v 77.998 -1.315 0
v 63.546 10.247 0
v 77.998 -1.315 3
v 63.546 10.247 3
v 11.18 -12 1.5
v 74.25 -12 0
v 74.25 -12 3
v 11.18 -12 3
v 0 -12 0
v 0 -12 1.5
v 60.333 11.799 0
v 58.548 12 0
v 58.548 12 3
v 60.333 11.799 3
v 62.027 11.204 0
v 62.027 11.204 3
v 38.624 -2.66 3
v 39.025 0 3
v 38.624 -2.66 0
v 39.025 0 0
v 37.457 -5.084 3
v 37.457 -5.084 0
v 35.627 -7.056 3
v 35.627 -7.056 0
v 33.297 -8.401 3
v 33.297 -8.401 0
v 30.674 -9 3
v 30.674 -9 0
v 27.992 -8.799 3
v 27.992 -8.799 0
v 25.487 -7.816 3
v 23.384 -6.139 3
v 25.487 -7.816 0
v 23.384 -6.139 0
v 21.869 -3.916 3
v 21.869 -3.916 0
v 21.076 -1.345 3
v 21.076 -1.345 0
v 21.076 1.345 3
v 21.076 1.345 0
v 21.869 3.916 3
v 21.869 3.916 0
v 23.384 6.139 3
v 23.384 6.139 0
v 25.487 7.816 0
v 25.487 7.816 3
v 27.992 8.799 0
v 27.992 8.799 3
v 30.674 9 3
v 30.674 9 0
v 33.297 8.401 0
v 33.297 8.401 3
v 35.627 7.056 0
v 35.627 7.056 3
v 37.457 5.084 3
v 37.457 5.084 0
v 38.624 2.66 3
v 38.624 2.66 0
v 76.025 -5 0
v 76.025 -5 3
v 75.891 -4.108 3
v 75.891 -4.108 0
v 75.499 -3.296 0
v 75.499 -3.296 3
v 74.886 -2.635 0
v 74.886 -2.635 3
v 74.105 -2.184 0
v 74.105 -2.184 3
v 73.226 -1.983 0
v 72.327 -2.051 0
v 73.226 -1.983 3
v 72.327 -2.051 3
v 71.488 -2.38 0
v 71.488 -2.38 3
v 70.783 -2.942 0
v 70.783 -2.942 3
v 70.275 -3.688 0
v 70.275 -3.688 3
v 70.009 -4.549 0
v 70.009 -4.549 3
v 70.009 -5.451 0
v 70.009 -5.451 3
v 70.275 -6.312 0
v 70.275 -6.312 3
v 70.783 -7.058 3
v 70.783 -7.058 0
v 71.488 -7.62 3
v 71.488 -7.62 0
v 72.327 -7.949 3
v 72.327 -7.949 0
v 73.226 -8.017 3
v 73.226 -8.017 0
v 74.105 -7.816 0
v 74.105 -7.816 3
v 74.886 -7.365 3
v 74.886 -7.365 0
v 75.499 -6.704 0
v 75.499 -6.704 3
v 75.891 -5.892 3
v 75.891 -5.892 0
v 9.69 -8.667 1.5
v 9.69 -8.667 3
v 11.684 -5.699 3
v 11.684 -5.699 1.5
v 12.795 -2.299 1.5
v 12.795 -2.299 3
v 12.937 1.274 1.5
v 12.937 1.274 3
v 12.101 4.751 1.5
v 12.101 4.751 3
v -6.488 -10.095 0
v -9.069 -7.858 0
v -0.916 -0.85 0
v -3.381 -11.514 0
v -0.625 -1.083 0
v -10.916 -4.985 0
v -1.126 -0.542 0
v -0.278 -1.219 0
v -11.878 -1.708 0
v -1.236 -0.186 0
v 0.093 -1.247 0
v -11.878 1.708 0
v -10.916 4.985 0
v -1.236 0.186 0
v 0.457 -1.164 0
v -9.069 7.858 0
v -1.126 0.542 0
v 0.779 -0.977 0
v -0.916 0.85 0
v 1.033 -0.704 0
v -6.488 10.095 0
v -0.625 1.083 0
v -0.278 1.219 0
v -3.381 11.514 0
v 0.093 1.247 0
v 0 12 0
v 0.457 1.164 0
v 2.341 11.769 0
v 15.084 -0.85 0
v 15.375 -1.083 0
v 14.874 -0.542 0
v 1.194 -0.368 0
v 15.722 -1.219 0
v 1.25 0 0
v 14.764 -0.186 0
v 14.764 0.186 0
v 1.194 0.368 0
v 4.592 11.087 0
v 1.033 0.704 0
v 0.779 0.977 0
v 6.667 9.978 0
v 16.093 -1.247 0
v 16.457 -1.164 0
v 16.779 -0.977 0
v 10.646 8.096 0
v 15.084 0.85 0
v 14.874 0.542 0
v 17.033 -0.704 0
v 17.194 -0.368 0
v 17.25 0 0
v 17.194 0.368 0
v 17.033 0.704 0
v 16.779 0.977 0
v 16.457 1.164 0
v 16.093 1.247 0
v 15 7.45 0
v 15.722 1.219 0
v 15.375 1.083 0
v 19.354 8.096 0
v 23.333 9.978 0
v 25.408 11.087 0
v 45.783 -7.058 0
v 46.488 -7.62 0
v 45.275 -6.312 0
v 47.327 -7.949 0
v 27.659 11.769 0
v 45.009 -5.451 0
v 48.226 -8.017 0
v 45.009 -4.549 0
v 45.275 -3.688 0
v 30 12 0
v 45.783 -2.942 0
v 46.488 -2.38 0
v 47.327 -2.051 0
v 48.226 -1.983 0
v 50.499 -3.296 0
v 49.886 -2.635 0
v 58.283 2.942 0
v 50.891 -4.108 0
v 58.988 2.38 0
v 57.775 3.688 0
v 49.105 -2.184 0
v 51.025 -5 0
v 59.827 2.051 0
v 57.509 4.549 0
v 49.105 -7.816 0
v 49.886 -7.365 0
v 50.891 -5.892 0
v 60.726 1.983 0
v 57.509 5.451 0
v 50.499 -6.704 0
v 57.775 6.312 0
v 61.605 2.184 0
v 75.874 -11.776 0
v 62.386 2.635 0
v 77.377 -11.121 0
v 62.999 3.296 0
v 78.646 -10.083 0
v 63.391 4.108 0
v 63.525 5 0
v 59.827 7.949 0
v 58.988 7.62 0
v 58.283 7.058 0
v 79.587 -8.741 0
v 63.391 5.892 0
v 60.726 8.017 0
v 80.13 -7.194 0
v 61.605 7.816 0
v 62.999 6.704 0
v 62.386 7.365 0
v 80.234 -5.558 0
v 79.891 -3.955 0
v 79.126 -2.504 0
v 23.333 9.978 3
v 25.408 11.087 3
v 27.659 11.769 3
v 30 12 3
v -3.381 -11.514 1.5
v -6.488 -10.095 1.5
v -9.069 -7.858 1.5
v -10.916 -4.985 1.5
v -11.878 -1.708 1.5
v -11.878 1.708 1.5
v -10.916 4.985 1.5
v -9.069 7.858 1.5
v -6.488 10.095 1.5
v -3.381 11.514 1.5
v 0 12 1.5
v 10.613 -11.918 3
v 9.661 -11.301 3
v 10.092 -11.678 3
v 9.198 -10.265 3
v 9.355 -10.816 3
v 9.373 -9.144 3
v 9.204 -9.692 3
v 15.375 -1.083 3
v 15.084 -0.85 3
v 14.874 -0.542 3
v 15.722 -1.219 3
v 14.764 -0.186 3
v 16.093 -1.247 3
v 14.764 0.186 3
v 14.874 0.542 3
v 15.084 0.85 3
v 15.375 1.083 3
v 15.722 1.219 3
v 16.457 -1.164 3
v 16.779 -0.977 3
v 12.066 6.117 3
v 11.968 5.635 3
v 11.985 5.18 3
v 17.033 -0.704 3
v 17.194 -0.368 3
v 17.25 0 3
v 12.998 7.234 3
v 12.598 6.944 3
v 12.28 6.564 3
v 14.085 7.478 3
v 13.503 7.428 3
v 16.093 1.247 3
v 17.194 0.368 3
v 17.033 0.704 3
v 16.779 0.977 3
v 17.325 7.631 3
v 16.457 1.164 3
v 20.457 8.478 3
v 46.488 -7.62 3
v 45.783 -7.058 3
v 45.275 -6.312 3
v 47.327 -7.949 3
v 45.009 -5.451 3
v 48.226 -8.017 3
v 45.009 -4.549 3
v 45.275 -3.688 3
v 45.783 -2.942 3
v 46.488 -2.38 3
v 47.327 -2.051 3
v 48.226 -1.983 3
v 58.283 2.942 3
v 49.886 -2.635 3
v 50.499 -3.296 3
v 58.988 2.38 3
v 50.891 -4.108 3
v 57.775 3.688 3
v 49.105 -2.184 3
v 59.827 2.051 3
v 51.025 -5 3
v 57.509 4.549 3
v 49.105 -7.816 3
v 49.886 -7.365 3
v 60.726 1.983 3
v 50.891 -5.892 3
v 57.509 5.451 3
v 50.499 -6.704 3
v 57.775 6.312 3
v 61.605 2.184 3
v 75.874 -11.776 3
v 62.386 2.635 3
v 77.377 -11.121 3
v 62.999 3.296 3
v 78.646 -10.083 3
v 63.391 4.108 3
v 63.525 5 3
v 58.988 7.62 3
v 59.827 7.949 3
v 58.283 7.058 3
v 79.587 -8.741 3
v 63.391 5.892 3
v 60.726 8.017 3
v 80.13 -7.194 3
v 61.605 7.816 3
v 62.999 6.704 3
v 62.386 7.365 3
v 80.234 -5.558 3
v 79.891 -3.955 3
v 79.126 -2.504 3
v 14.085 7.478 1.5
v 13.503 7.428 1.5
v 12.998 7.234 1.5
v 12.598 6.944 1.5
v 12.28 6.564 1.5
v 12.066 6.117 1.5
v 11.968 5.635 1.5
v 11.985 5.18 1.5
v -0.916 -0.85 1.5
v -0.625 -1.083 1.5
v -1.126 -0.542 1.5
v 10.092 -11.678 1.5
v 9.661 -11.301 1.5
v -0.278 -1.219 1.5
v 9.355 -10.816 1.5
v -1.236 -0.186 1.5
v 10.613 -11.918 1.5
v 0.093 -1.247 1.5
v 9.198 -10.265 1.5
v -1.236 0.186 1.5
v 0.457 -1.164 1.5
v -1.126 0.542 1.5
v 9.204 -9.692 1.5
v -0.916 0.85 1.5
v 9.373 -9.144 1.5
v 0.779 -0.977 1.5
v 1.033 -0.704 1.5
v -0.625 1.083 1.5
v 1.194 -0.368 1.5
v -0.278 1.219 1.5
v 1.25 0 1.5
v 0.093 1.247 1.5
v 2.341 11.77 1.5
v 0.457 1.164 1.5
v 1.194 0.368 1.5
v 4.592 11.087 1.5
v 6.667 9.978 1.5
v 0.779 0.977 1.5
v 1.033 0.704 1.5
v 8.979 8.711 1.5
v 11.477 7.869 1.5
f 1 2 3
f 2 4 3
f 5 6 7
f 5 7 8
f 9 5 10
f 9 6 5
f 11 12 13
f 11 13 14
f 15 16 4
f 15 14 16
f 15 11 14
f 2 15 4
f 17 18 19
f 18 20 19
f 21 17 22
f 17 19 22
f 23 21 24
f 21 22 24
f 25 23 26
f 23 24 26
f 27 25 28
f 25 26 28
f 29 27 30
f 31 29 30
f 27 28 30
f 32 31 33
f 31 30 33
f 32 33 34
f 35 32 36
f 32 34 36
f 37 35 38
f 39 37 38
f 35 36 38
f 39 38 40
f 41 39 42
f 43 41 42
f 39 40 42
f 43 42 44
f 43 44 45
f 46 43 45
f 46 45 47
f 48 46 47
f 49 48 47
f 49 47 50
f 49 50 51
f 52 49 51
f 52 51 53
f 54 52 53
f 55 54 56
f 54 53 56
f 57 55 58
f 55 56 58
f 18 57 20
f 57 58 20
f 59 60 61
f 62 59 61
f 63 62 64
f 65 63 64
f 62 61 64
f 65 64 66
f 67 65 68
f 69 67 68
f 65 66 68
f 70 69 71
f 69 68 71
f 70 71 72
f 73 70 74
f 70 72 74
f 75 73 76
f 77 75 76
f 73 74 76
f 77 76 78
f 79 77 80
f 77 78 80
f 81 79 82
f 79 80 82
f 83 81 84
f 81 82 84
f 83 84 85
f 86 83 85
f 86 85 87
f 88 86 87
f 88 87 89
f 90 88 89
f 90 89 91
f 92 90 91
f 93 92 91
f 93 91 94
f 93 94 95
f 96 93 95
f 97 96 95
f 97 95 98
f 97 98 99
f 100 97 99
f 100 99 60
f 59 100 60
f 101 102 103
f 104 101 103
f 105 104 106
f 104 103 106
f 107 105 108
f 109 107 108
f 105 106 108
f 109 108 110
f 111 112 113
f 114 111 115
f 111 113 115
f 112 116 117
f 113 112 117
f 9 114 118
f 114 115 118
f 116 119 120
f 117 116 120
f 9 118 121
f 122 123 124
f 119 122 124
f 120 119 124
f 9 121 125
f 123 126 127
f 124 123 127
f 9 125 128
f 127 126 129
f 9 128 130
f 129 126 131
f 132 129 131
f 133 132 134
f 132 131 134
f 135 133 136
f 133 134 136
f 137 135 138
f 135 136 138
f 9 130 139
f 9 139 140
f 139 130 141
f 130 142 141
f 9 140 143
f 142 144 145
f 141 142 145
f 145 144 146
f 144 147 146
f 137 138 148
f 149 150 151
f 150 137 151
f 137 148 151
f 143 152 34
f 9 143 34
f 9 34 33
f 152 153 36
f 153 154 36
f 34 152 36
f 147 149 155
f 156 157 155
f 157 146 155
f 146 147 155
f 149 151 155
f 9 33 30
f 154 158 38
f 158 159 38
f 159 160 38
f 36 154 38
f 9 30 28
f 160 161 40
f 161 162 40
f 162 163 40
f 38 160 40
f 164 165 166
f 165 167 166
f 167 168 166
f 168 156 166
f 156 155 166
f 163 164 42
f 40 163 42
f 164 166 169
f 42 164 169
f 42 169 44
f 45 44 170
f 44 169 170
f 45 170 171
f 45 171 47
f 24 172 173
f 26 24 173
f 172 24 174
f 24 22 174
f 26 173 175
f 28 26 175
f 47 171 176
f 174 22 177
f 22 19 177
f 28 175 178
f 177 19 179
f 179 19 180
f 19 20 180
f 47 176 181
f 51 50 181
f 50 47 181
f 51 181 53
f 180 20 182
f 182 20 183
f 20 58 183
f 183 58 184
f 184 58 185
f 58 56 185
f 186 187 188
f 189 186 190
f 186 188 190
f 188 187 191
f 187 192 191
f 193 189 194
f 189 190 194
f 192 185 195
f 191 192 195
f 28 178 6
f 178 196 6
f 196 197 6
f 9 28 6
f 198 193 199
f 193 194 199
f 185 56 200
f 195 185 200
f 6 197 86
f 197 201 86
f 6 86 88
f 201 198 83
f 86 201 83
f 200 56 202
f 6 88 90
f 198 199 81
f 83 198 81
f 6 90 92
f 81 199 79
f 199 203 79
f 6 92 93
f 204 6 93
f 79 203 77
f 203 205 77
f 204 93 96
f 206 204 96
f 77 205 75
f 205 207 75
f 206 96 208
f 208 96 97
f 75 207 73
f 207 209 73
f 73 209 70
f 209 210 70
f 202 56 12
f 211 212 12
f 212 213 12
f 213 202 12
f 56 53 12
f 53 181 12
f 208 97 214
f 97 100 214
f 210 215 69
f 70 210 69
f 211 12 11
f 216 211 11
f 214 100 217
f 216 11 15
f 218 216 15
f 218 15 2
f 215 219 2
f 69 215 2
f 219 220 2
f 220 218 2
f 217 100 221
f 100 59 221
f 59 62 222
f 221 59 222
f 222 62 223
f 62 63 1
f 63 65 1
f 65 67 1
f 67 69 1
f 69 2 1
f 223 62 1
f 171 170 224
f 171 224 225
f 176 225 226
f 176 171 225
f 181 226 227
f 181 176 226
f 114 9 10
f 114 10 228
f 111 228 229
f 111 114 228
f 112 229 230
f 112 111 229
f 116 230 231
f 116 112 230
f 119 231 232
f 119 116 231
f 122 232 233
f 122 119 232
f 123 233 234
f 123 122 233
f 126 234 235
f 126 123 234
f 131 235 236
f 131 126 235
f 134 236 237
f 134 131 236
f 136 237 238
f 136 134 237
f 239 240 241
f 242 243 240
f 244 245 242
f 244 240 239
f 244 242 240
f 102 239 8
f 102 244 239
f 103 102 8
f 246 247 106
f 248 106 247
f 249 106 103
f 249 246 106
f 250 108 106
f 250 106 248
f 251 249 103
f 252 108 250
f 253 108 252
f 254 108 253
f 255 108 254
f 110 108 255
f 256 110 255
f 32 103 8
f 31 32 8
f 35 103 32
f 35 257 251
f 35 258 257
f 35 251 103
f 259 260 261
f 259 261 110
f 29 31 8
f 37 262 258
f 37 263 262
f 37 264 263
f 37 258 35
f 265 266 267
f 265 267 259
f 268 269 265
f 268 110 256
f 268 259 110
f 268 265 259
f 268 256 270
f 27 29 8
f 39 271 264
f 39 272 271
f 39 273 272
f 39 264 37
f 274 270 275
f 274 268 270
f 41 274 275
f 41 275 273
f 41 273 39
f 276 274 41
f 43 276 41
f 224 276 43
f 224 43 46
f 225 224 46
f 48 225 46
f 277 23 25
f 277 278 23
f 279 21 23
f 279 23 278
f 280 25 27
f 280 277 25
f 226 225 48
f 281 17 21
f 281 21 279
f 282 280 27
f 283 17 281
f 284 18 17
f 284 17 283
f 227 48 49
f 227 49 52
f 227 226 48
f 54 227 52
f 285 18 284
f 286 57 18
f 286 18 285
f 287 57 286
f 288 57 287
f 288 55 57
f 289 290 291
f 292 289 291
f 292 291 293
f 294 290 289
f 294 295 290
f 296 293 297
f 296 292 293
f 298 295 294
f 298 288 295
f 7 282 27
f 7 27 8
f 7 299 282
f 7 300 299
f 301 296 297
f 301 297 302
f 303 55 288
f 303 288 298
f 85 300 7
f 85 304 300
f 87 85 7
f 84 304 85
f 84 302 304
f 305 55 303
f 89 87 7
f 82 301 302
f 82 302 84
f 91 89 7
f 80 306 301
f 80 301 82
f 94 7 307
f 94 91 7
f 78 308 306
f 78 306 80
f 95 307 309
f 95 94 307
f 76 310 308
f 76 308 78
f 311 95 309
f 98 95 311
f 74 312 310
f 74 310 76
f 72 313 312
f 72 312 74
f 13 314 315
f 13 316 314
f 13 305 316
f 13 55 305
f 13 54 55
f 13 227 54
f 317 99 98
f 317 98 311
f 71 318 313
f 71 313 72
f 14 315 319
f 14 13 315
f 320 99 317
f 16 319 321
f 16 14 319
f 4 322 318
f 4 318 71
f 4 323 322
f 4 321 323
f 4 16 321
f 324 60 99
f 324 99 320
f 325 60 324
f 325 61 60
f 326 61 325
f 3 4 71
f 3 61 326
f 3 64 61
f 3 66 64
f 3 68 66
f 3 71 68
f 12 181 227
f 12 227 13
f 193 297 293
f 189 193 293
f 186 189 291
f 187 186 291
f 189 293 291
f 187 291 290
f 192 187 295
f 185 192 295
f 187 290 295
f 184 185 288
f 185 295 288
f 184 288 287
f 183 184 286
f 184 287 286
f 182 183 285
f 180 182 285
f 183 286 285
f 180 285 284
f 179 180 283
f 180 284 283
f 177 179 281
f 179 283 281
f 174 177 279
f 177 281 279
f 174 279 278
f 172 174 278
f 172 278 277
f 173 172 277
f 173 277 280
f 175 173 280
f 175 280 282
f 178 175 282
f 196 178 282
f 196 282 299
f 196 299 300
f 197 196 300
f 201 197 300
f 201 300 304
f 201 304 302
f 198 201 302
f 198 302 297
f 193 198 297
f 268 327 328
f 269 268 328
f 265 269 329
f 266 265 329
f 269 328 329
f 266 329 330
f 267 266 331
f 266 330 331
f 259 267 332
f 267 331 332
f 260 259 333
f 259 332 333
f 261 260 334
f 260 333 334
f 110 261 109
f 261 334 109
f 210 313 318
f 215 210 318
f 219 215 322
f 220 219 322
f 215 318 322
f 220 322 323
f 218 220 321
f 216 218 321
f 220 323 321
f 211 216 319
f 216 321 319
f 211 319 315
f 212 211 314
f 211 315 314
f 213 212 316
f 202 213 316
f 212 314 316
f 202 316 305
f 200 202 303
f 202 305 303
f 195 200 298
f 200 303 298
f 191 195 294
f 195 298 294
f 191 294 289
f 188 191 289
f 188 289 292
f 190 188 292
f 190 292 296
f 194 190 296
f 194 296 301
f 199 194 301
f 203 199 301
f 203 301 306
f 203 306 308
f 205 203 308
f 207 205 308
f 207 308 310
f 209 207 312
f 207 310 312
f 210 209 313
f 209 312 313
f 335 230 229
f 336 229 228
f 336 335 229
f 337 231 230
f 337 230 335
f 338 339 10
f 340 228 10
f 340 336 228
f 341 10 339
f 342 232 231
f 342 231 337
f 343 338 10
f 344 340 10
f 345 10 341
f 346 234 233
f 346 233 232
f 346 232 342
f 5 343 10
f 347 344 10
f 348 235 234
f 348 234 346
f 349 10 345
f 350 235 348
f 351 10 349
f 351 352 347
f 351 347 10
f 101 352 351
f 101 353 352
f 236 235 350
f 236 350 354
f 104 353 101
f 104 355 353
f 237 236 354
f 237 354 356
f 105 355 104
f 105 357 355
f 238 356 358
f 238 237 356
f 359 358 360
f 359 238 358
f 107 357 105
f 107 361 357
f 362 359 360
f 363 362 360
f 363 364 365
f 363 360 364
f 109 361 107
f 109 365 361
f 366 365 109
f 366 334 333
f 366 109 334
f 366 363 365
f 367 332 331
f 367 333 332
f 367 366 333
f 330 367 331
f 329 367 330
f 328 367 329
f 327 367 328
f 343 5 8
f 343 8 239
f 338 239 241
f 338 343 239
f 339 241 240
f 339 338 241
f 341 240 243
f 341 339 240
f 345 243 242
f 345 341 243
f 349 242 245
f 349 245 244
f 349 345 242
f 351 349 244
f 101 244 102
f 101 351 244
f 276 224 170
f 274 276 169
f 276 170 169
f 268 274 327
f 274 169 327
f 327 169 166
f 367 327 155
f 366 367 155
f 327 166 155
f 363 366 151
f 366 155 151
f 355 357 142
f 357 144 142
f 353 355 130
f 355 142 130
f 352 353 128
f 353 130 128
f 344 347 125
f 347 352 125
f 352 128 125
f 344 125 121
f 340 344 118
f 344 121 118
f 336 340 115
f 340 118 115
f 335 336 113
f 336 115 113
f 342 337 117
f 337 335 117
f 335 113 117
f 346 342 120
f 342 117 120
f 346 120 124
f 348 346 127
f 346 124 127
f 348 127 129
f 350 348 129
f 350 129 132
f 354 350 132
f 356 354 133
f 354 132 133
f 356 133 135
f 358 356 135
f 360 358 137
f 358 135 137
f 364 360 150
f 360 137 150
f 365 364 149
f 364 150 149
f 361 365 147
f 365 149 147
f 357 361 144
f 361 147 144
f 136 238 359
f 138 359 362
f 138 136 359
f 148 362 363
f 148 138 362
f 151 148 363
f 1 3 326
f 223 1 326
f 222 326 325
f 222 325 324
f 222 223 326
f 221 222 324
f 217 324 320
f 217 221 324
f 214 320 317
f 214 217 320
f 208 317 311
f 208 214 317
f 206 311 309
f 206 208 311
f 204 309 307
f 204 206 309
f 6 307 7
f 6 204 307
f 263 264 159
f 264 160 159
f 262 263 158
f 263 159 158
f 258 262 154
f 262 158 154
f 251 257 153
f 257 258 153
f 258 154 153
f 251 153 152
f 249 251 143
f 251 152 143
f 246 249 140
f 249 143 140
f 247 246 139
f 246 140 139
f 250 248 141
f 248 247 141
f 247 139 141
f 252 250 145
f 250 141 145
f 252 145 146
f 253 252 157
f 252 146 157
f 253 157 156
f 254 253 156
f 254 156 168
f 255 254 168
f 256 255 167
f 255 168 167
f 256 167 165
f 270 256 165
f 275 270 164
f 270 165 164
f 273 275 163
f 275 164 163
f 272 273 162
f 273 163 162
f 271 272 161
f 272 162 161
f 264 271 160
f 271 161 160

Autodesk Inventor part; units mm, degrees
ref_plane "YZ Plane" through (0, 0, 0) normal (1, 0, 0) x (0, 1, 0)
ref_plane "XZ Plane" through (0, 0, 0) normal (0, 1, 0) x (-1, 0, 0)
ref_plane "XY Plane" through (0, 0, 0) normal (0, 0, 1) x (1, 0, 0)
sketch "スケッチ1" plane through (0, 0, 0) normal (0, 0, 1) x (1, 0, 0)
  line L0 (0, 0) -> (30, 0) construction
  line L1 (0, 12) -> (30, 12)
  line L2 (30, -12) -> (0, -12)
  arc A0 (0, 12) -> (0, -12) centre (0, 0) ccw
  arc A1 (30, -12) -> (30, 12) centre (30, 0) ccw
  circle A2 centre (0, 0) radius 1.25
  circle A3 centre (30, 0) radius 9.025
  arc A4 (6.6667, 9.9778) -> (23.3333, 9.9778) centre (15, 22.4499) ccw
  arc A5 (30, 12) -> (30, -12) centre (30, 0) ccw construction
  arc A6 (0, -12) -> (0, 12) centre (0, 0) ccw construction
  arc A7 (6.6667, 9.9778) -> (0, 12) centre (0, 0) ccw
  arc A8 (30, 12) -> (23.3333, 9.9778) centre (30, 0) ccw
  line L3 (30, 12) -> (92.8308, 12)
  line L4 (92.8308, 12) -> (92.8308, -12)
  line L5 (92.8308, -12) -> (30, -12)
  line L6 (30, -12) -> (30, 12)
  circle A9 centre (16, 0) radius 1.25
  dimension "d0" = 30
  dimension "d1" = 12
  dimension "d2" = 2.5
  dimension "d3" = 18.05
  dimension "d6" = 15
  dimension "d11" = 2.5
  dimension "d12" = 16
extrude "押し出し1" add sketch "スケッチ1" along normal blind 3 contours A7 A4 A8 L6 A3 L2 A0 | L3 L4 L5 A1 | A1 L6 A3
sketch "スケッチ2" plane through (0, 0, 3) normal (0, 0, 1) x (1, 0, 0)
  arc A0 (30, 12) -> (23.3333, 9.9778) centre (30, 0) ccw projected
  arc A1 (6.6667, 9.9778) -> (23.3333, 9.9778) centre (15, 22.4499) ccw projected
  arc A2 (6.6667, 9.9778) -> (0, -12) centre (0, 0) ccw projected
  line L0 (0, -12) -> (92.8308, -12) projected
  line L1 (92.8308, -12) -> (92.8308, 12) projected
  line L2 (92.8308, 12) -> (30, 12) projected
  circle A3 centre (0, 0) radius 1.25 projected
  circle A4 centre (30, 0) radius 9.025 projected
  line L3 (0, -12) -> (92.8308, -12) projected
  arc A5 (6.6667, 9.9778) -> (23.3333, 9.9778) centre (15, 22.4499) ccw projected
  arc A6 (0, -12) -> (6.6667, 9.9778) centre (0, 0) ccw
  arc A7 (0, -13) -> (7.8, 10.4) centre (0, 0) ccw
  point P0 (5, -12)
  point P1 (9.9986, 8.3083)
  dimension "d7" = 1
extrude "押し出し2" cut sketch "スケッチ2" against normal blind 1.5 contours A7 L0 A6 A1 | A6 A2
fillet "フィレット1" radius 2 2 edges at (9.9986, 8.3083, 2.25) (5, -12, 2.25)
sketch "スケッチ3" plane through (0, 0, 3) normal (0, 0, 1) x (1, 0, 0)
  arc A0 (30.0122, 16.3221) -> (24.9131, 15.5052) centre (30.0122, 0) ccw
  arc A1 (6.6694, 14.2981) -> (24.9131, 15.5052) centre (15.0061, 26.768) ccw
  arc A2 (6.6694, 14.2981) -> (0, -7.6779) centre (0, 4.3221) ccw
  line L0 (0, -7.6779) -> (30, -7.6779)
  circle A3 centre (0, 0) radius 1.5
  circle A4 centre (16, 0) radius 1.25
  circle A5 centre (48, -5) radius 3.025
  circle A6 centre (73, -5) radius 3.025
  circle A7 centre (60.5, 5) radius 3.025
  line L1 (48, -5) -> (73, -5) construction
  line L2 (61.3547, 12) -> (92.8308, -13.1809)
  line L3 (60.5, 5) -> (73, -5) construction
  line L4 (60.5, 5) -> (60.5, -5) construction
  circle A8 centre (30, 0) radius 9.025 projected
  circle A9 centre (16, 0) radius 1.25 projected
  circle A10 centre (30, 0) radius 9.025 projected
  arc A11 (9.6896, -8.6667) -> (11.1803, -12) centre (11.1803, -10) ccw projected
  line L5 (11.1803, -12) -> (92.8308, -12) projected
  line L6 (92.8308, -12) -> (92.8308, 12) projected
  line L7 (92.8308, 12) -> (30, 12) projected
  arc A12 (30, 12) -> (23.3333, 9.9778) centre (30, 0) ccw projected
  arc A13 (14.0846, 7.4779) -> (23.3333, 9.9778) centre (15, 22.4499) ccw projected
  arc A14 (14.0846, 7.4779) -> (12.1008, 4.7507) centre (13.9625, 5.4816) ccw projected
  arc A15 (9.6896, -8.6667) -> (12.1008, 4.7507) centre (0, 0) ccw projected
  line L8 (92.8308, 12) -> (30, 12) projected
  line L9 (92.8308, -12) -> (92.8308, 12) projected
  point P0 (60.5, 0)
  point P1 (61.3547, 12)
  point P2 (91.3547, -12)
  point P3 (91.3547, -12)
  dimension "d13" = 6.05
  dimension "d14" = 6.05
  dimension "d15" = 6.05
  dimension "d16" = 25
  dimension "d17" = 10
  dimension "d19" = 6
  dimension "d20" = 18
extrude "押し出し3" cut sketch "スケッチ3" against normal blind 10 contours A5 | A6 | A7 | L7 L6 L5 L2
fillet "フィレット2" radius 8 1 edges at (61.3547, 12, 1.5)
fillet "フィレット3" radius 6 1 edges at (91.3547, -12, 1.5)
properties part number "揺動節"
